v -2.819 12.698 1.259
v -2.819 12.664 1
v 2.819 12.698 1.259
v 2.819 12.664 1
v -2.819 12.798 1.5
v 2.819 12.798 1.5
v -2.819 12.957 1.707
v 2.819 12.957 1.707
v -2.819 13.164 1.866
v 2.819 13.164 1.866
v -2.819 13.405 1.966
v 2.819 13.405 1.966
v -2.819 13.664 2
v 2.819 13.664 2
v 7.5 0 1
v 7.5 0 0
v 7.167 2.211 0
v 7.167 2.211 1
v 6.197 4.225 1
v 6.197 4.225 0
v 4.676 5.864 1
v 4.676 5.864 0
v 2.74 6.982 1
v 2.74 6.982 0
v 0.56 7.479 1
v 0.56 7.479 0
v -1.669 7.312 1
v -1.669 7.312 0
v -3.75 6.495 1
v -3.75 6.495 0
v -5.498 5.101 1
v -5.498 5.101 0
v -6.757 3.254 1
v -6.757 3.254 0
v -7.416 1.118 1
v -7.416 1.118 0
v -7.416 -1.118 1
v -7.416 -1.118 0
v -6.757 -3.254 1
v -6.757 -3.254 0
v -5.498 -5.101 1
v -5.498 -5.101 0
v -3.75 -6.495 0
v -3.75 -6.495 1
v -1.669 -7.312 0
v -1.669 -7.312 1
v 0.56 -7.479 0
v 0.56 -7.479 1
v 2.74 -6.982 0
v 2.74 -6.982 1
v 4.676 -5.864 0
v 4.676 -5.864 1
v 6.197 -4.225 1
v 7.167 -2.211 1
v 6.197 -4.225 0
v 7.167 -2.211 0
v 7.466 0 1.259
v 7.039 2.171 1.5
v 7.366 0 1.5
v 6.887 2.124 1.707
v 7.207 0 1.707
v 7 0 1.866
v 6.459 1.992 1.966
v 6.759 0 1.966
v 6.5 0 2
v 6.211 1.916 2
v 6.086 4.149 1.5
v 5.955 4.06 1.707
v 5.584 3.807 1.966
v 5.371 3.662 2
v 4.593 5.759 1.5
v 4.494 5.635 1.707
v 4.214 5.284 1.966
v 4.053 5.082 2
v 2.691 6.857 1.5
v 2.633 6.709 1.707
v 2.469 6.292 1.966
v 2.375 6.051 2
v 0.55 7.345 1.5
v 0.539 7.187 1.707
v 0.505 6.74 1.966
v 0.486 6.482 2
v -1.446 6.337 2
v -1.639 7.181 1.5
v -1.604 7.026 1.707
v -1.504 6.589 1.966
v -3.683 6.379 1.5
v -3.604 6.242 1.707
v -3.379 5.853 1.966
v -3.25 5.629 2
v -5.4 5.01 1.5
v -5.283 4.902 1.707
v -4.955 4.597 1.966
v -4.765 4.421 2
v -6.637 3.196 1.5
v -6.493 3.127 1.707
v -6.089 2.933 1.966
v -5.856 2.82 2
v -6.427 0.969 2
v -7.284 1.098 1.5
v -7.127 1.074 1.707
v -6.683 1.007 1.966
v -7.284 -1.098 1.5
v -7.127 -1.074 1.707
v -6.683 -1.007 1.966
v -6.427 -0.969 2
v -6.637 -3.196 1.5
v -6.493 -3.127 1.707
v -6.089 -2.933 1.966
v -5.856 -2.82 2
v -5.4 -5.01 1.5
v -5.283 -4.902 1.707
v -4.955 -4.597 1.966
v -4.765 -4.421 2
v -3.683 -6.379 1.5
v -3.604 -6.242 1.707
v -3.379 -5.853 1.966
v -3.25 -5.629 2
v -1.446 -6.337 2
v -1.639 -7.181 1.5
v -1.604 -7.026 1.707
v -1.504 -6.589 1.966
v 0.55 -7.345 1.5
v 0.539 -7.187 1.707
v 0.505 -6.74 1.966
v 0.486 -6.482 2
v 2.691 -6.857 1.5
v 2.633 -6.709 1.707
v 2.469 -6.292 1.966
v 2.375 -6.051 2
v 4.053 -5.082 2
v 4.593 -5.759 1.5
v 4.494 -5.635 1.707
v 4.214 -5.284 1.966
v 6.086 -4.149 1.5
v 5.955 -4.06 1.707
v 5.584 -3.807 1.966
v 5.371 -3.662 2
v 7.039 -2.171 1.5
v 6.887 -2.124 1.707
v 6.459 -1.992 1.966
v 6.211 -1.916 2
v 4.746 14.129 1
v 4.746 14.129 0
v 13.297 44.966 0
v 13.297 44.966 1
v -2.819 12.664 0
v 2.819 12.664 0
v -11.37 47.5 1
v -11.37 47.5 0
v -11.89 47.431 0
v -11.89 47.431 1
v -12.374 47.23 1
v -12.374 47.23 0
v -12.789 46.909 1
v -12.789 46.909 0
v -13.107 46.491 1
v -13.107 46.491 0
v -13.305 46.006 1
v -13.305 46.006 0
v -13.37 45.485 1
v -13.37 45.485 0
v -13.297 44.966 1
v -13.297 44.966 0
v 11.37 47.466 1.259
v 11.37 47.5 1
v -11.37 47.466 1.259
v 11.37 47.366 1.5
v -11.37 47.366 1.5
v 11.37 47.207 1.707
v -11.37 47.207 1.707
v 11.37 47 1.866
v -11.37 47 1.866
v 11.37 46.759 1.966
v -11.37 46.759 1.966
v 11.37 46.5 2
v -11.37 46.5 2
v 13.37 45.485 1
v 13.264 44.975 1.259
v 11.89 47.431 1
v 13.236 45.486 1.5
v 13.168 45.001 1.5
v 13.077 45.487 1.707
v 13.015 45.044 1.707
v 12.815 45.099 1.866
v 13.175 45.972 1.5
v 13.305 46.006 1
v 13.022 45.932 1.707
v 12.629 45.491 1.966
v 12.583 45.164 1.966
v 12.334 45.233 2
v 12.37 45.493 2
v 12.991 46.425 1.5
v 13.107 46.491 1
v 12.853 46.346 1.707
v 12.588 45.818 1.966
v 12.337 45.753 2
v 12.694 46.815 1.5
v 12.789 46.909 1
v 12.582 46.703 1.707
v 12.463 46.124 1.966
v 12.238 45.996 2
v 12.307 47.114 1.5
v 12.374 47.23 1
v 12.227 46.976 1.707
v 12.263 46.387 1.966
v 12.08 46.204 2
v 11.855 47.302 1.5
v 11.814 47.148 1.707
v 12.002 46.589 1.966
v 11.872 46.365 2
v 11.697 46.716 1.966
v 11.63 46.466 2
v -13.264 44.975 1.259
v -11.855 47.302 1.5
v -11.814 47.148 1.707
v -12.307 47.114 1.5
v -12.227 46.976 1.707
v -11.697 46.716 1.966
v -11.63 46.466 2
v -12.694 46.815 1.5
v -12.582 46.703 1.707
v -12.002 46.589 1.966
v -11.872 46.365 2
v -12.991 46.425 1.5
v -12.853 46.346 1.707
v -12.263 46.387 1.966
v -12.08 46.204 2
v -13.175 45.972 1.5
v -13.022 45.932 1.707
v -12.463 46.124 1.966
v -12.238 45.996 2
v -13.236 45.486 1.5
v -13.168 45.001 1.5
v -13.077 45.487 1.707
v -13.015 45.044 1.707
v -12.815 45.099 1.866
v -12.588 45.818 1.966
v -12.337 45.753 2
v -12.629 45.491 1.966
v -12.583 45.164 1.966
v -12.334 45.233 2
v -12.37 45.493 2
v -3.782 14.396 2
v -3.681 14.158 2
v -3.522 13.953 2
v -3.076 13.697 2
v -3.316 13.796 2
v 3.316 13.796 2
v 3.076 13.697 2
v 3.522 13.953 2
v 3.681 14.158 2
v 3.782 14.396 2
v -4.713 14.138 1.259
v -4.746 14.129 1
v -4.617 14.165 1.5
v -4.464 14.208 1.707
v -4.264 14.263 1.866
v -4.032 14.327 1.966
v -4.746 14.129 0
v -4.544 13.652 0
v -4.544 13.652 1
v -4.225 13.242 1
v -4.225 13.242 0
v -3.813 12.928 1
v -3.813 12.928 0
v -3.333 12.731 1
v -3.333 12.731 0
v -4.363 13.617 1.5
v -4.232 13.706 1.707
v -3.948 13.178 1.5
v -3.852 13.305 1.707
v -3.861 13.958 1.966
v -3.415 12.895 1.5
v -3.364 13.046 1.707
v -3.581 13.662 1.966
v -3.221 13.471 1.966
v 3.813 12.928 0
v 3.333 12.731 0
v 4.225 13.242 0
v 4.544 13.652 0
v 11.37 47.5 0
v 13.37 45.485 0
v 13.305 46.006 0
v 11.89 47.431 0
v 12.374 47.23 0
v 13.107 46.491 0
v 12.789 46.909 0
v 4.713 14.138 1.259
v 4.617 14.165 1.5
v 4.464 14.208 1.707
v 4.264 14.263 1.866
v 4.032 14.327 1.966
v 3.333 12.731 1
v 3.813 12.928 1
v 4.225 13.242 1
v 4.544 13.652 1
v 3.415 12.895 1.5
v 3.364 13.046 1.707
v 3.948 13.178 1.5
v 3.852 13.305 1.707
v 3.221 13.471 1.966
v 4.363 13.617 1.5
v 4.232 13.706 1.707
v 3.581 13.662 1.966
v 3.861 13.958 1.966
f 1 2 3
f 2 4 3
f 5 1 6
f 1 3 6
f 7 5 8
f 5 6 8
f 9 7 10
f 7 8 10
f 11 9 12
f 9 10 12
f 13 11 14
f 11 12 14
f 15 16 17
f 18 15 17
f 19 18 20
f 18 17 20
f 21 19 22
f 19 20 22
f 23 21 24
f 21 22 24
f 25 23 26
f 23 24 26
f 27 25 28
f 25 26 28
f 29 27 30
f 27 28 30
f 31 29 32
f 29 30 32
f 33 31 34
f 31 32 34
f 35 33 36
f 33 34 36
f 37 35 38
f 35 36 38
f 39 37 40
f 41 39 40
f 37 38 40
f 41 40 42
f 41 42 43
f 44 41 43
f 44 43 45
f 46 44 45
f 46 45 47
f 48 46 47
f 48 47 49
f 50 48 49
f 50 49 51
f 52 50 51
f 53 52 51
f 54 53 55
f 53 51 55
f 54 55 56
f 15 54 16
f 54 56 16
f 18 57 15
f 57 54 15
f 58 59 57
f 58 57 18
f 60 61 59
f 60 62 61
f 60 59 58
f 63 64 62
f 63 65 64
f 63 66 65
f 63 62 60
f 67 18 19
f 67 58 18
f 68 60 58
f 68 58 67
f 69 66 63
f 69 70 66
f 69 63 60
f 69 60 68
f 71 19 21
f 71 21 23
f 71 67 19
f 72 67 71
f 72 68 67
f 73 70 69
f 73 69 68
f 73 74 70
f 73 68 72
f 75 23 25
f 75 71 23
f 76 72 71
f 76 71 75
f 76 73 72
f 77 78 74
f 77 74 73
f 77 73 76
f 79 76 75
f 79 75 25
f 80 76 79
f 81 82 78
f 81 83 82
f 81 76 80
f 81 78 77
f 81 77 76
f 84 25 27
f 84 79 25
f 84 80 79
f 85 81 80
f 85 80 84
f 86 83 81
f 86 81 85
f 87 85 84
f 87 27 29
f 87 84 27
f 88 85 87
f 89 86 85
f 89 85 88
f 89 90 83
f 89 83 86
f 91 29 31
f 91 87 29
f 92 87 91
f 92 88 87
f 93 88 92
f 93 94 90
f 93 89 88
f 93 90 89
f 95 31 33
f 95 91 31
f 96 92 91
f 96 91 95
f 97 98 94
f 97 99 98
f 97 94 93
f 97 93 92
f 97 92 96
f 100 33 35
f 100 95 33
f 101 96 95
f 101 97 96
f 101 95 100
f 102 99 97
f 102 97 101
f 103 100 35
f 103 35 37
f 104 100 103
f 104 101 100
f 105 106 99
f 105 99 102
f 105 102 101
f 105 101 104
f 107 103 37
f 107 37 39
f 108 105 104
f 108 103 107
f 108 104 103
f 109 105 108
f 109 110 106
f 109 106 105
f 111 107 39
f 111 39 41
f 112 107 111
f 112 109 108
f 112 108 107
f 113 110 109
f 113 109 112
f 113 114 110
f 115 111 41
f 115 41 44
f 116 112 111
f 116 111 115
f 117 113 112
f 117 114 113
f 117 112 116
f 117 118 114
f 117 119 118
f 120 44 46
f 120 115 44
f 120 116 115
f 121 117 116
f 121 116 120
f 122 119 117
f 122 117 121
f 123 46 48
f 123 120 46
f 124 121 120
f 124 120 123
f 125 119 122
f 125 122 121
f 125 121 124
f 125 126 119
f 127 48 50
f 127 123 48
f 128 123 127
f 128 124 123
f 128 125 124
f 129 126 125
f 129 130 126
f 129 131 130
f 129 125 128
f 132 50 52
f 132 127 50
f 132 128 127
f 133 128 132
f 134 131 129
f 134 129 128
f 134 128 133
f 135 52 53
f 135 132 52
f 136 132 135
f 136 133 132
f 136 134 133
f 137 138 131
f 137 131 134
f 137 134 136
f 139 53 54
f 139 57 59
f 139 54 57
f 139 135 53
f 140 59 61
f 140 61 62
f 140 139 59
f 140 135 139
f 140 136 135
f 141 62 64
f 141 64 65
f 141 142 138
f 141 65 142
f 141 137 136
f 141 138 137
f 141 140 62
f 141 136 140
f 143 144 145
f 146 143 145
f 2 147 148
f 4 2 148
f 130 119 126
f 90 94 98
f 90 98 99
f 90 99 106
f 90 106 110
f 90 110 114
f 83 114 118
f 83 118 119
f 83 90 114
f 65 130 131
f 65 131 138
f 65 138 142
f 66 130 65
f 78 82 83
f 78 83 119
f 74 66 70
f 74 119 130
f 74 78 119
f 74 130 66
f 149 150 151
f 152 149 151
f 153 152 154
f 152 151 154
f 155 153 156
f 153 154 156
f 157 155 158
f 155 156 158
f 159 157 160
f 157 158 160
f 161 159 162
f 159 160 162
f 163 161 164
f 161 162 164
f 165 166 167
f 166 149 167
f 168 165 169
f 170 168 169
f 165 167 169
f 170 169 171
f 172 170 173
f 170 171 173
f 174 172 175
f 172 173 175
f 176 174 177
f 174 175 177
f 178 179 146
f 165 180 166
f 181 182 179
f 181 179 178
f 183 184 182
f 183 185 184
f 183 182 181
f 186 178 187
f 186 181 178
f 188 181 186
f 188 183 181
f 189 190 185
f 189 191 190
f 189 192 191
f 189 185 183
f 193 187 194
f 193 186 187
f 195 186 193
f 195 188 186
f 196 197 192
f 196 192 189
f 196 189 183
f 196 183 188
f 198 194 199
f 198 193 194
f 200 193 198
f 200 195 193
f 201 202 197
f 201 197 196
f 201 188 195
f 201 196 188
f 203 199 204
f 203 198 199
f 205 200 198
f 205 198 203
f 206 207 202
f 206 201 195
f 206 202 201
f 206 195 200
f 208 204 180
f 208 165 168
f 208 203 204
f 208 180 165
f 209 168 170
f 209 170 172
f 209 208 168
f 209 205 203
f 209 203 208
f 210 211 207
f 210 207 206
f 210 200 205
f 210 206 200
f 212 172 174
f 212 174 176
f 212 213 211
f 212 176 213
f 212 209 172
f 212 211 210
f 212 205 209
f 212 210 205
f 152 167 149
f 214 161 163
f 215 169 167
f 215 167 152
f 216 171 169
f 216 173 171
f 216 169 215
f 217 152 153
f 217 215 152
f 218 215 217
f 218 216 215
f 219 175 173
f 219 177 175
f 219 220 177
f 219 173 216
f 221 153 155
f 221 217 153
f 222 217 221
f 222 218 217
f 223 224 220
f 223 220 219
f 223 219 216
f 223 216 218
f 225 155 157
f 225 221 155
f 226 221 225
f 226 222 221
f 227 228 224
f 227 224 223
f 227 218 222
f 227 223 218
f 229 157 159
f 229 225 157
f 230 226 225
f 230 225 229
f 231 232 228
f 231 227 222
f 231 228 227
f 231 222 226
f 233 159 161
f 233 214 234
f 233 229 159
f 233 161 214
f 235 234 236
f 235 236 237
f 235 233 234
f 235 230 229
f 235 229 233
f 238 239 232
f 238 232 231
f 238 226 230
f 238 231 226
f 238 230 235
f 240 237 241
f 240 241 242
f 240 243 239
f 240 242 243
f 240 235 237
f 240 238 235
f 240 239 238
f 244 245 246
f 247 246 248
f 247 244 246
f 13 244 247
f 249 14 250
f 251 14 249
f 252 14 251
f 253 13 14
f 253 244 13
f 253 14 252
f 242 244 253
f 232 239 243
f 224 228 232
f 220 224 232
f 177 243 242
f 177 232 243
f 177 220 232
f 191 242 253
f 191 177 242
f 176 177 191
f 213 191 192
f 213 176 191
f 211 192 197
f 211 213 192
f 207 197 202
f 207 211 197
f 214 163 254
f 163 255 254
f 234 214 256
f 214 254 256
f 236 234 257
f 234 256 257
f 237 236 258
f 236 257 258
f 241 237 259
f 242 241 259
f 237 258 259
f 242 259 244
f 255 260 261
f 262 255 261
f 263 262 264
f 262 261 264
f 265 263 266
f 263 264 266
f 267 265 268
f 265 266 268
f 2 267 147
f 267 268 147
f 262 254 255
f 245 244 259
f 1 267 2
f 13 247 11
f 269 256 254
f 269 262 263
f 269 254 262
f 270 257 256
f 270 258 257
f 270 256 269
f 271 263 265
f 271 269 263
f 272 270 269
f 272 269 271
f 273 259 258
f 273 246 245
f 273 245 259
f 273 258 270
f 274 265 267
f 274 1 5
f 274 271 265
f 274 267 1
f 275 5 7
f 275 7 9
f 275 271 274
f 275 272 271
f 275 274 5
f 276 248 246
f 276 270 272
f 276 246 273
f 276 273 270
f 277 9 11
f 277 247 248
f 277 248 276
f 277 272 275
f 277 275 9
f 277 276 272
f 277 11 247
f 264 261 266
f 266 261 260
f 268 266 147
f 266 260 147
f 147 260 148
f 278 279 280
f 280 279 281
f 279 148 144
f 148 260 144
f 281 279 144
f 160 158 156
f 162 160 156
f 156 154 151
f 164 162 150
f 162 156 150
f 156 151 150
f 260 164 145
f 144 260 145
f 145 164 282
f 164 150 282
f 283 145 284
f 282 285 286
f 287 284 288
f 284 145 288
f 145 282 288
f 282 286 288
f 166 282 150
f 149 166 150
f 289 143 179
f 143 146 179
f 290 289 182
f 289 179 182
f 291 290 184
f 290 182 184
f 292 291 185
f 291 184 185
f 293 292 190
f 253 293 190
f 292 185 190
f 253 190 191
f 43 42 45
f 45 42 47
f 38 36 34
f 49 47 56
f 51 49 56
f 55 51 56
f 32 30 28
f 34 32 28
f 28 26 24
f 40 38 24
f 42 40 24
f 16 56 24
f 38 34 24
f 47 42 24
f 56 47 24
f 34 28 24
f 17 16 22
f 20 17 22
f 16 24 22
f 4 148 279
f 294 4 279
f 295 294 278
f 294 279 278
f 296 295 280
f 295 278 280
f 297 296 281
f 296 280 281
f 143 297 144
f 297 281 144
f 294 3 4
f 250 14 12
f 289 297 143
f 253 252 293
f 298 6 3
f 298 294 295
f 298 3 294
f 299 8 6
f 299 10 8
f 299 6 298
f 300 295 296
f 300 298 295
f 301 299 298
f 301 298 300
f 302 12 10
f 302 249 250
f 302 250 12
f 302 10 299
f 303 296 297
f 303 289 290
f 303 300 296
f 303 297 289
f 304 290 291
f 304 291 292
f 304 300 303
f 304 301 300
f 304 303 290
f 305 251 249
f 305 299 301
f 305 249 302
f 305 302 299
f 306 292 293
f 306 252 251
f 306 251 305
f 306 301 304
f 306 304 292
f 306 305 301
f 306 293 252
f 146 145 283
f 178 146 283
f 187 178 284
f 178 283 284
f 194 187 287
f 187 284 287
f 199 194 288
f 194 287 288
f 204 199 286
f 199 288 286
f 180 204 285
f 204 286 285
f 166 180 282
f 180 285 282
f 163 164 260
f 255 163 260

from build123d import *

# Parameters (mm, degrees)
F0_R     = 7.5
F1_DEPTH = 2
F2_R     = 1


with BuildPart() as f1:
    # F0 (on Top) → F1 (new body)
    with BuildSketch(Plane.XY):
        Circle(F0_R)
        with BuildLine():
            Line((11.369901, 47.5), (0, 47.5))
            Line((0, 47.5), (-11.369901, 47.5))
            ThreePointArc((-11.369901, 47.5), (-12.961897, 46.710598), (-13.297169, 44.965548))
            Line((-13.297169, 44.965548), (-4.74593, 14.129265))
            ThreePointArc((-4.74593, 14.129265), (-4.029261, 13.071721), (-2.818663, 12.663717))
            Line((-2.818663, 12.663717), (0, 12.663717))
            Line((0, 12.663717), (2.818663, 12.663717))
            ThreePointArc((2.818663, 12.663717), (4.029261, 13.071721), (4.74593, 14.129265))
            Line((4.74593, 14.129265), (13.297169, 44.965548))
            ThreePointArc((13.297169, 44.965548), (12.961897, 46.710598), (11.369901, 47.5))
        make_face()
    extrude(amount=F1_DEPTH)

    # F2
    f2_edges = [f1.edges().sort_by_distance(p)[0] for p in [
        (-9.021549, 29.547406, 2),
        (-7.5, 0, 2),
    ]]
    fillet(f2_edges, radius=F2_R)


solid = f1.part
